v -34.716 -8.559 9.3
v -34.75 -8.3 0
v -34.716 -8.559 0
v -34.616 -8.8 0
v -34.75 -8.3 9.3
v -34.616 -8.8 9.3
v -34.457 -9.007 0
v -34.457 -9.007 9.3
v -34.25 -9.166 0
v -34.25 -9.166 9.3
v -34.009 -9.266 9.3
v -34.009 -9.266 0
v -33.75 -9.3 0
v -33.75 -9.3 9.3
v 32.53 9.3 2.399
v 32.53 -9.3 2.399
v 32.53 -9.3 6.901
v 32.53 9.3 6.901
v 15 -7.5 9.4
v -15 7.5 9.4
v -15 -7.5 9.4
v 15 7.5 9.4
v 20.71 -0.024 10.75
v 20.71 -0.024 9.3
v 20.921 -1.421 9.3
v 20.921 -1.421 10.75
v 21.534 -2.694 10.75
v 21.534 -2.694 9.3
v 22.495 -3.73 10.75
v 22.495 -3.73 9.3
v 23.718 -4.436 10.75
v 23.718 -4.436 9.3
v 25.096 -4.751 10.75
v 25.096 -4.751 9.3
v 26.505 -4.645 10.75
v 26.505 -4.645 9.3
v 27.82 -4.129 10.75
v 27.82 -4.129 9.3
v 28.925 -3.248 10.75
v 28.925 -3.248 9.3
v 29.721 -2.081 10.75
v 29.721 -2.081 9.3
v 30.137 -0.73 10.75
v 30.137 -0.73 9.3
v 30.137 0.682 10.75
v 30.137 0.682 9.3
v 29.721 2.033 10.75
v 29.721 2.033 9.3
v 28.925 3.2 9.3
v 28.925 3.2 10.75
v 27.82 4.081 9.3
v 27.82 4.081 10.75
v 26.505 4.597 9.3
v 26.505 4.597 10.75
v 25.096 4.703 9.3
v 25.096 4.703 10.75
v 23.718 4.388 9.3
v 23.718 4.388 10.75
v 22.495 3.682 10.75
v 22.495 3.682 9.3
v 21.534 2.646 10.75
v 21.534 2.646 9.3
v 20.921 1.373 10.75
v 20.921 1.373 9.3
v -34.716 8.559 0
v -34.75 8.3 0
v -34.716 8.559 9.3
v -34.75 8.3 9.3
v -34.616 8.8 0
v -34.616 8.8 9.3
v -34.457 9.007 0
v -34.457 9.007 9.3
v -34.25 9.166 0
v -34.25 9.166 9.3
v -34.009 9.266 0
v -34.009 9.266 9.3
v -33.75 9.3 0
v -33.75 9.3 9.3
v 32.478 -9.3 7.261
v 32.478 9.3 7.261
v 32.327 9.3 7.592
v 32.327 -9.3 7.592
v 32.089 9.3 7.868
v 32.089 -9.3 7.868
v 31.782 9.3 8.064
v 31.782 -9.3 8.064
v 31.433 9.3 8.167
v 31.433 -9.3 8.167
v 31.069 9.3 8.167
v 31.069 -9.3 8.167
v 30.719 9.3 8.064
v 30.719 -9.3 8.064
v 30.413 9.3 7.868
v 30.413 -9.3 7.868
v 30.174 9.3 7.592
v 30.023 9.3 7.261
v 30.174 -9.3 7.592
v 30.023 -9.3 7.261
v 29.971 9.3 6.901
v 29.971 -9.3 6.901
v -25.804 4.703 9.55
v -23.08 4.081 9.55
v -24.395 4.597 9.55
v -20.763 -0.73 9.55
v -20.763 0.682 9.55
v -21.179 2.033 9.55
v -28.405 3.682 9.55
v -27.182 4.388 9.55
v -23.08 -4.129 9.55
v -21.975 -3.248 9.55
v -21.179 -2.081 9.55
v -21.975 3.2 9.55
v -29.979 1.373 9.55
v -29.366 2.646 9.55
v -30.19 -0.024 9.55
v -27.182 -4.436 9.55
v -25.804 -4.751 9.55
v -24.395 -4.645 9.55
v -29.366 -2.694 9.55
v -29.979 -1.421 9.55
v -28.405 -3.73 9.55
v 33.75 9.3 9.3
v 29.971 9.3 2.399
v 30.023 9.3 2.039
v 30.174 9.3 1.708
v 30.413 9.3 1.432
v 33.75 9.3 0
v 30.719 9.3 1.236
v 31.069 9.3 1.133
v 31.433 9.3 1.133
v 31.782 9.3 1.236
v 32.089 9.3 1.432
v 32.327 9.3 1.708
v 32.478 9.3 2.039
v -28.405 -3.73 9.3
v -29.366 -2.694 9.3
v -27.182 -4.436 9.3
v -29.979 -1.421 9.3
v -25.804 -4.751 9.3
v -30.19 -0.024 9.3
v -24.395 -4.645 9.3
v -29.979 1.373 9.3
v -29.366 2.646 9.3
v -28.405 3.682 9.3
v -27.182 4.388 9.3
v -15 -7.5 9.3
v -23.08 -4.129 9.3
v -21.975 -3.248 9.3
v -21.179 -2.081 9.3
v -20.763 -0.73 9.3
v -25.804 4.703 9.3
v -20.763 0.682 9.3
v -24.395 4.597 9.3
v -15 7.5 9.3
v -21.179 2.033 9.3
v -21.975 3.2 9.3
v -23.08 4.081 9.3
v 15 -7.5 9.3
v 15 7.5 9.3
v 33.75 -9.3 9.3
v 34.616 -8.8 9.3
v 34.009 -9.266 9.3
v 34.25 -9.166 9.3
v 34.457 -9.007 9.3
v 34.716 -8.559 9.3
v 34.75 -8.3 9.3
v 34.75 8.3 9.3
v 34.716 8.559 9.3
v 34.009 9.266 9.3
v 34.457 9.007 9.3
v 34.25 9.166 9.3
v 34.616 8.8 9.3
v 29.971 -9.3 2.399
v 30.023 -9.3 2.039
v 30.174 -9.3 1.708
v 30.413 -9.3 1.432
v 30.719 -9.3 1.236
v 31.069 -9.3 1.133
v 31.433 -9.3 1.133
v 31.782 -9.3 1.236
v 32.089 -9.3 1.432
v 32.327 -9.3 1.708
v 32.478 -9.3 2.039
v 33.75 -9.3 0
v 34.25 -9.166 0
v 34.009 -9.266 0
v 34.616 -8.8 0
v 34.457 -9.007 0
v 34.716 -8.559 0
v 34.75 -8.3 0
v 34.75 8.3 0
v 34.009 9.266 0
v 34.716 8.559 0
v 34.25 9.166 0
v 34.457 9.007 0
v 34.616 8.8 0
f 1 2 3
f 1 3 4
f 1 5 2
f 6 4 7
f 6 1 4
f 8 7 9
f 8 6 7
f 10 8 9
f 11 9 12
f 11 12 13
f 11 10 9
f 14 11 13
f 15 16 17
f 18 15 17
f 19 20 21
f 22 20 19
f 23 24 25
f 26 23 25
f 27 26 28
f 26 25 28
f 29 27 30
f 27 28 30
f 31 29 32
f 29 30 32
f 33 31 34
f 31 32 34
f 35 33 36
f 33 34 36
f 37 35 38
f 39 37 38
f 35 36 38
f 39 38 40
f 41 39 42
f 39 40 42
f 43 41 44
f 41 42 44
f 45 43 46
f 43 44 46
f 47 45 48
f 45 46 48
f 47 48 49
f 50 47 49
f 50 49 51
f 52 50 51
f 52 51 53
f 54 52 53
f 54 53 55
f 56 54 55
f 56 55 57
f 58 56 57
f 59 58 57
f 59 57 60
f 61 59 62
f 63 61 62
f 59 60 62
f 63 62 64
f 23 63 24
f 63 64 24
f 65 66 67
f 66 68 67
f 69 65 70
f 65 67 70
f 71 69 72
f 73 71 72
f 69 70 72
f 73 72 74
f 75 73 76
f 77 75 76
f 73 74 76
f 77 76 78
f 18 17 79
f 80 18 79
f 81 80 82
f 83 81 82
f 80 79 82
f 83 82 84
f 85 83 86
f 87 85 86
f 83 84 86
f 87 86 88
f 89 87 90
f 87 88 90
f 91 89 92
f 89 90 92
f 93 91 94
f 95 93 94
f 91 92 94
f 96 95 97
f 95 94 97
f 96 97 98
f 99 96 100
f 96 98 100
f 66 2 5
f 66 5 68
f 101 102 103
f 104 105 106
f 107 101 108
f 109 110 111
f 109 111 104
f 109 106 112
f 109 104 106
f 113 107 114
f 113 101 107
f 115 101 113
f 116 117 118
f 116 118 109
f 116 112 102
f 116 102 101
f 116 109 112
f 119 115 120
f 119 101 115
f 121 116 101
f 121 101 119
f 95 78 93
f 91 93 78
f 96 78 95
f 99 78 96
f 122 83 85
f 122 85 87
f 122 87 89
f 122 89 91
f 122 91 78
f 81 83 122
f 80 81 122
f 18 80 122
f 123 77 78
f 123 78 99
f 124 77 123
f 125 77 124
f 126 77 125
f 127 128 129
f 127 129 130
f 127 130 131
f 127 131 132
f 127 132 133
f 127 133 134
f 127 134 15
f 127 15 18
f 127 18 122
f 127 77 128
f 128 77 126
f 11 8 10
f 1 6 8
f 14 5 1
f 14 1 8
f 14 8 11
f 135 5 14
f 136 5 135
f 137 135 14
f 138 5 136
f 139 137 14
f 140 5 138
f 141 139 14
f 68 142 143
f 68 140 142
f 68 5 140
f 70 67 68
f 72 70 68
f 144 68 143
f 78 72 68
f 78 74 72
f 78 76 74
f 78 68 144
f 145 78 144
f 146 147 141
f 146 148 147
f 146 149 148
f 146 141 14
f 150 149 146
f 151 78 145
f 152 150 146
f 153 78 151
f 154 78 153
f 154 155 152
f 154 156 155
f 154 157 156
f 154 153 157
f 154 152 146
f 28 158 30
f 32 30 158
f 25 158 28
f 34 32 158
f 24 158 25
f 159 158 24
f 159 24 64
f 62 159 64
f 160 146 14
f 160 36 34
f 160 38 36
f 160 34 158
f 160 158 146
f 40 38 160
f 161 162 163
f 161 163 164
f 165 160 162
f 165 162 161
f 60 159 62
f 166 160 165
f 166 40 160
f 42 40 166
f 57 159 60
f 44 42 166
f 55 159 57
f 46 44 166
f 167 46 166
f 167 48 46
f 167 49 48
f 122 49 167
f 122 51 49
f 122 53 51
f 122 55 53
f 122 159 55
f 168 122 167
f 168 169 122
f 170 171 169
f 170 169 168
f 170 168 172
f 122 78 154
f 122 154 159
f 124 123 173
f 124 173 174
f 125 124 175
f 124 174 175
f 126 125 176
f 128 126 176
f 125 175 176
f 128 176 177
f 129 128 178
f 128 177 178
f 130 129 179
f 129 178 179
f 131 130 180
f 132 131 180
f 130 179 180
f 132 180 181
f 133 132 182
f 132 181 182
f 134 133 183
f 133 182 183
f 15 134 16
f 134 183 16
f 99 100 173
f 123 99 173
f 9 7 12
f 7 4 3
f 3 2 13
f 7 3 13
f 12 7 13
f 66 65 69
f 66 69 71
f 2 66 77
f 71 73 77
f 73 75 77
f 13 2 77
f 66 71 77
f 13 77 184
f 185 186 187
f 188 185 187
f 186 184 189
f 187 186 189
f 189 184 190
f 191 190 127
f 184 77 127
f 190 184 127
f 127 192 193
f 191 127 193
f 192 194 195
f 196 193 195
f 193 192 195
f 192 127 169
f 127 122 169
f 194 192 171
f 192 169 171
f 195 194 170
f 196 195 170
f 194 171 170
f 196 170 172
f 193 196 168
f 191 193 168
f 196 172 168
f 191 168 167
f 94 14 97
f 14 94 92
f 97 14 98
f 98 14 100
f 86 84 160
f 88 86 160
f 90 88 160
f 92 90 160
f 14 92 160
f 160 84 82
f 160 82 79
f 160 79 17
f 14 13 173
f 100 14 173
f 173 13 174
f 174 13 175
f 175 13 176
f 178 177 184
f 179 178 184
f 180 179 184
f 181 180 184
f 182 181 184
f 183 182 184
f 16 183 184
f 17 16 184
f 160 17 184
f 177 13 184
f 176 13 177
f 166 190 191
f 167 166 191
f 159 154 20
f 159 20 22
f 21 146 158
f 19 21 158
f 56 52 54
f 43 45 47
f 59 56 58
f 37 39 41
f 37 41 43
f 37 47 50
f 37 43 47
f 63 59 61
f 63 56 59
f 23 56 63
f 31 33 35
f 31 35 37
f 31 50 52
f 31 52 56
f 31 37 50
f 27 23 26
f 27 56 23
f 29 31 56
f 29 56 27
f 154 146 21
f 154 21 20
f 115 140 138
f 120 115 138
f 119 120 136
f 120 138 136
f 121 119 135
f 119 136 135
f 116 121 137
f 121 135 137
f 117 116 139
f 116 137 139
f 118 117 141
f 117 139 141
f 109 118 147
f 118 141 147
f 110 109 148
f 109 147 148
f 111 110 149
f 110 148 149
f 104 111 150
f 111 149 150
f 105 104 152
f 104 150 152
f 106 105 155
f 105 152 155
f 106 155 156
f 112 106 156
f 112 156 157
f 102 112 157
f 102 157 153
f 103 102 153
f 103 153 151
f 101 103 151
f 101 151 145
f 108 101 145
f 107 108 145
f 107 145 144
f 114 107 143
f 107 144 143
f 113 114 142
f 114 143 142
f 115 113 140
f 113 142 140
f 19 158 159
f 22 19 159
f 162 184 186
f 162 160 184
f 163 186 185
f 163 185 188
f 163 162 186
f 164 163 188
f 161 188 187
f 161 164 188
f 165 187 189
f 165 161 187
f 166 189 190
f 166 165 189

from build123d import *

# Parameters (mm, degrees)
ESQUISSE1_W                  = 69.5
ESQUISSE1_H                  = 18.6
BOSS_EXTRU_1_DEPTH           = 9.3
ENL_V_MAT_EXTRU_1_DEPTH      = 41.497067795
ENL_V_MAT_EXTRU_1_DEPTH_BACK = 41.497067795
CONG_1_R                     = 1
ESQUISSE3_R                  = 4.74
BOSS_EXTRU_2_DEPTH           = 1.45
ESQUISSE4_R                  = 4.74
BOSS_EXTRU_3_DEPTH           = 0.25
ESQUISSE5_W                  = 30
ESQUISSE5_H                  = 15
BOSS_EXTRU_4_DEPTH           = 0.1


with BuildPart() as part:
    # Esquisse1 → Boss.-Extru.1 (new body)
    with BuildSketch(Plane.XY):
        Rectangle(ESQUISSE1_W, ESQUISSE1_H)
    extrude(amount=BOSS_EXTRU_1_DEPTH)

    # Esquisse2 → Enlèv. mat.-Extru.1 (cut, two sides: drawn at the far end of the back side and taken through both)
    with BuildSketch(Plane(origin=(0, 9.3, 0), x_dir=(1, 0, 0), z_dir=(0, 1, 0)).offset(-ENL_V_MAT_EXTRU_1_DEPTH_BACK)):
        with BuildLine():
            Line((29.971199051, -6.900645436), (29.971199051, -2.399354564))
            ThreePointArc((29.971199051, -2.399354564), (31.250676471, -1.119877145), (32.53015389, -2.399354564))
            Line((32.53015389, -2.399354564), (32.53015389, -6.900645436))
            ThreePointArc((32.53015389, -6.900645436), (31.250676471, -8.180122855), (29.971199051, -6.900645436))
        make_face()
    extrude(amount=ENL_V_MAT_EXTRU_1_DEPTH + ENL_V_MAT_EXTRU_1_DEPTH_BACK, mode=Mode.SUBTRACT)

    # Congé1
    cong_1_edges = [part.edges().sort_by_distance(p)[0] for p in [
        (34.75, -9.3, 4.65),
        (-34.75, -9.3, 4.65),
        (-34.75, 9.3, 4.65),
        (34.75, 9.3, 4.65),
    ]]
    fillet(cong_1_edges, radius=CONG_1_R)

    # Esquisse3 → Boss.-Extru.2 (add)
    with BuildSketch(Plane.XY.offset(9.3)):
        with Locations(Location((25.450020764, -0.023971243, 0), (0, 0, 180))):
            Circle(ESQUISSE3_R)
    extrude(amount=BOSS_EXTRU_2_DEPTH)

    # Esquisse4 → Boss.-Extru.3 (add)
    with BuildSketch(Plane.XY.offset(9.3)):
        with Locations(Location((-25.450020764, -0.023971243, 0), (0, 0, 180))):
            Circle(ESQUISSE4_R)
    extrude(amount=BOSS_EXTRU_3_DEPTH)

    # Esquisse5 → Boss.-Extru.4 (add)
    with BuildSketch(Plane.XY.offset(9.3)):
        Rectangle(ESQUISSE5_W, ESQUISSE5_H)
    extrude(amount=BOSS_EXTRU_4_DEPTH)


solid = part.part
